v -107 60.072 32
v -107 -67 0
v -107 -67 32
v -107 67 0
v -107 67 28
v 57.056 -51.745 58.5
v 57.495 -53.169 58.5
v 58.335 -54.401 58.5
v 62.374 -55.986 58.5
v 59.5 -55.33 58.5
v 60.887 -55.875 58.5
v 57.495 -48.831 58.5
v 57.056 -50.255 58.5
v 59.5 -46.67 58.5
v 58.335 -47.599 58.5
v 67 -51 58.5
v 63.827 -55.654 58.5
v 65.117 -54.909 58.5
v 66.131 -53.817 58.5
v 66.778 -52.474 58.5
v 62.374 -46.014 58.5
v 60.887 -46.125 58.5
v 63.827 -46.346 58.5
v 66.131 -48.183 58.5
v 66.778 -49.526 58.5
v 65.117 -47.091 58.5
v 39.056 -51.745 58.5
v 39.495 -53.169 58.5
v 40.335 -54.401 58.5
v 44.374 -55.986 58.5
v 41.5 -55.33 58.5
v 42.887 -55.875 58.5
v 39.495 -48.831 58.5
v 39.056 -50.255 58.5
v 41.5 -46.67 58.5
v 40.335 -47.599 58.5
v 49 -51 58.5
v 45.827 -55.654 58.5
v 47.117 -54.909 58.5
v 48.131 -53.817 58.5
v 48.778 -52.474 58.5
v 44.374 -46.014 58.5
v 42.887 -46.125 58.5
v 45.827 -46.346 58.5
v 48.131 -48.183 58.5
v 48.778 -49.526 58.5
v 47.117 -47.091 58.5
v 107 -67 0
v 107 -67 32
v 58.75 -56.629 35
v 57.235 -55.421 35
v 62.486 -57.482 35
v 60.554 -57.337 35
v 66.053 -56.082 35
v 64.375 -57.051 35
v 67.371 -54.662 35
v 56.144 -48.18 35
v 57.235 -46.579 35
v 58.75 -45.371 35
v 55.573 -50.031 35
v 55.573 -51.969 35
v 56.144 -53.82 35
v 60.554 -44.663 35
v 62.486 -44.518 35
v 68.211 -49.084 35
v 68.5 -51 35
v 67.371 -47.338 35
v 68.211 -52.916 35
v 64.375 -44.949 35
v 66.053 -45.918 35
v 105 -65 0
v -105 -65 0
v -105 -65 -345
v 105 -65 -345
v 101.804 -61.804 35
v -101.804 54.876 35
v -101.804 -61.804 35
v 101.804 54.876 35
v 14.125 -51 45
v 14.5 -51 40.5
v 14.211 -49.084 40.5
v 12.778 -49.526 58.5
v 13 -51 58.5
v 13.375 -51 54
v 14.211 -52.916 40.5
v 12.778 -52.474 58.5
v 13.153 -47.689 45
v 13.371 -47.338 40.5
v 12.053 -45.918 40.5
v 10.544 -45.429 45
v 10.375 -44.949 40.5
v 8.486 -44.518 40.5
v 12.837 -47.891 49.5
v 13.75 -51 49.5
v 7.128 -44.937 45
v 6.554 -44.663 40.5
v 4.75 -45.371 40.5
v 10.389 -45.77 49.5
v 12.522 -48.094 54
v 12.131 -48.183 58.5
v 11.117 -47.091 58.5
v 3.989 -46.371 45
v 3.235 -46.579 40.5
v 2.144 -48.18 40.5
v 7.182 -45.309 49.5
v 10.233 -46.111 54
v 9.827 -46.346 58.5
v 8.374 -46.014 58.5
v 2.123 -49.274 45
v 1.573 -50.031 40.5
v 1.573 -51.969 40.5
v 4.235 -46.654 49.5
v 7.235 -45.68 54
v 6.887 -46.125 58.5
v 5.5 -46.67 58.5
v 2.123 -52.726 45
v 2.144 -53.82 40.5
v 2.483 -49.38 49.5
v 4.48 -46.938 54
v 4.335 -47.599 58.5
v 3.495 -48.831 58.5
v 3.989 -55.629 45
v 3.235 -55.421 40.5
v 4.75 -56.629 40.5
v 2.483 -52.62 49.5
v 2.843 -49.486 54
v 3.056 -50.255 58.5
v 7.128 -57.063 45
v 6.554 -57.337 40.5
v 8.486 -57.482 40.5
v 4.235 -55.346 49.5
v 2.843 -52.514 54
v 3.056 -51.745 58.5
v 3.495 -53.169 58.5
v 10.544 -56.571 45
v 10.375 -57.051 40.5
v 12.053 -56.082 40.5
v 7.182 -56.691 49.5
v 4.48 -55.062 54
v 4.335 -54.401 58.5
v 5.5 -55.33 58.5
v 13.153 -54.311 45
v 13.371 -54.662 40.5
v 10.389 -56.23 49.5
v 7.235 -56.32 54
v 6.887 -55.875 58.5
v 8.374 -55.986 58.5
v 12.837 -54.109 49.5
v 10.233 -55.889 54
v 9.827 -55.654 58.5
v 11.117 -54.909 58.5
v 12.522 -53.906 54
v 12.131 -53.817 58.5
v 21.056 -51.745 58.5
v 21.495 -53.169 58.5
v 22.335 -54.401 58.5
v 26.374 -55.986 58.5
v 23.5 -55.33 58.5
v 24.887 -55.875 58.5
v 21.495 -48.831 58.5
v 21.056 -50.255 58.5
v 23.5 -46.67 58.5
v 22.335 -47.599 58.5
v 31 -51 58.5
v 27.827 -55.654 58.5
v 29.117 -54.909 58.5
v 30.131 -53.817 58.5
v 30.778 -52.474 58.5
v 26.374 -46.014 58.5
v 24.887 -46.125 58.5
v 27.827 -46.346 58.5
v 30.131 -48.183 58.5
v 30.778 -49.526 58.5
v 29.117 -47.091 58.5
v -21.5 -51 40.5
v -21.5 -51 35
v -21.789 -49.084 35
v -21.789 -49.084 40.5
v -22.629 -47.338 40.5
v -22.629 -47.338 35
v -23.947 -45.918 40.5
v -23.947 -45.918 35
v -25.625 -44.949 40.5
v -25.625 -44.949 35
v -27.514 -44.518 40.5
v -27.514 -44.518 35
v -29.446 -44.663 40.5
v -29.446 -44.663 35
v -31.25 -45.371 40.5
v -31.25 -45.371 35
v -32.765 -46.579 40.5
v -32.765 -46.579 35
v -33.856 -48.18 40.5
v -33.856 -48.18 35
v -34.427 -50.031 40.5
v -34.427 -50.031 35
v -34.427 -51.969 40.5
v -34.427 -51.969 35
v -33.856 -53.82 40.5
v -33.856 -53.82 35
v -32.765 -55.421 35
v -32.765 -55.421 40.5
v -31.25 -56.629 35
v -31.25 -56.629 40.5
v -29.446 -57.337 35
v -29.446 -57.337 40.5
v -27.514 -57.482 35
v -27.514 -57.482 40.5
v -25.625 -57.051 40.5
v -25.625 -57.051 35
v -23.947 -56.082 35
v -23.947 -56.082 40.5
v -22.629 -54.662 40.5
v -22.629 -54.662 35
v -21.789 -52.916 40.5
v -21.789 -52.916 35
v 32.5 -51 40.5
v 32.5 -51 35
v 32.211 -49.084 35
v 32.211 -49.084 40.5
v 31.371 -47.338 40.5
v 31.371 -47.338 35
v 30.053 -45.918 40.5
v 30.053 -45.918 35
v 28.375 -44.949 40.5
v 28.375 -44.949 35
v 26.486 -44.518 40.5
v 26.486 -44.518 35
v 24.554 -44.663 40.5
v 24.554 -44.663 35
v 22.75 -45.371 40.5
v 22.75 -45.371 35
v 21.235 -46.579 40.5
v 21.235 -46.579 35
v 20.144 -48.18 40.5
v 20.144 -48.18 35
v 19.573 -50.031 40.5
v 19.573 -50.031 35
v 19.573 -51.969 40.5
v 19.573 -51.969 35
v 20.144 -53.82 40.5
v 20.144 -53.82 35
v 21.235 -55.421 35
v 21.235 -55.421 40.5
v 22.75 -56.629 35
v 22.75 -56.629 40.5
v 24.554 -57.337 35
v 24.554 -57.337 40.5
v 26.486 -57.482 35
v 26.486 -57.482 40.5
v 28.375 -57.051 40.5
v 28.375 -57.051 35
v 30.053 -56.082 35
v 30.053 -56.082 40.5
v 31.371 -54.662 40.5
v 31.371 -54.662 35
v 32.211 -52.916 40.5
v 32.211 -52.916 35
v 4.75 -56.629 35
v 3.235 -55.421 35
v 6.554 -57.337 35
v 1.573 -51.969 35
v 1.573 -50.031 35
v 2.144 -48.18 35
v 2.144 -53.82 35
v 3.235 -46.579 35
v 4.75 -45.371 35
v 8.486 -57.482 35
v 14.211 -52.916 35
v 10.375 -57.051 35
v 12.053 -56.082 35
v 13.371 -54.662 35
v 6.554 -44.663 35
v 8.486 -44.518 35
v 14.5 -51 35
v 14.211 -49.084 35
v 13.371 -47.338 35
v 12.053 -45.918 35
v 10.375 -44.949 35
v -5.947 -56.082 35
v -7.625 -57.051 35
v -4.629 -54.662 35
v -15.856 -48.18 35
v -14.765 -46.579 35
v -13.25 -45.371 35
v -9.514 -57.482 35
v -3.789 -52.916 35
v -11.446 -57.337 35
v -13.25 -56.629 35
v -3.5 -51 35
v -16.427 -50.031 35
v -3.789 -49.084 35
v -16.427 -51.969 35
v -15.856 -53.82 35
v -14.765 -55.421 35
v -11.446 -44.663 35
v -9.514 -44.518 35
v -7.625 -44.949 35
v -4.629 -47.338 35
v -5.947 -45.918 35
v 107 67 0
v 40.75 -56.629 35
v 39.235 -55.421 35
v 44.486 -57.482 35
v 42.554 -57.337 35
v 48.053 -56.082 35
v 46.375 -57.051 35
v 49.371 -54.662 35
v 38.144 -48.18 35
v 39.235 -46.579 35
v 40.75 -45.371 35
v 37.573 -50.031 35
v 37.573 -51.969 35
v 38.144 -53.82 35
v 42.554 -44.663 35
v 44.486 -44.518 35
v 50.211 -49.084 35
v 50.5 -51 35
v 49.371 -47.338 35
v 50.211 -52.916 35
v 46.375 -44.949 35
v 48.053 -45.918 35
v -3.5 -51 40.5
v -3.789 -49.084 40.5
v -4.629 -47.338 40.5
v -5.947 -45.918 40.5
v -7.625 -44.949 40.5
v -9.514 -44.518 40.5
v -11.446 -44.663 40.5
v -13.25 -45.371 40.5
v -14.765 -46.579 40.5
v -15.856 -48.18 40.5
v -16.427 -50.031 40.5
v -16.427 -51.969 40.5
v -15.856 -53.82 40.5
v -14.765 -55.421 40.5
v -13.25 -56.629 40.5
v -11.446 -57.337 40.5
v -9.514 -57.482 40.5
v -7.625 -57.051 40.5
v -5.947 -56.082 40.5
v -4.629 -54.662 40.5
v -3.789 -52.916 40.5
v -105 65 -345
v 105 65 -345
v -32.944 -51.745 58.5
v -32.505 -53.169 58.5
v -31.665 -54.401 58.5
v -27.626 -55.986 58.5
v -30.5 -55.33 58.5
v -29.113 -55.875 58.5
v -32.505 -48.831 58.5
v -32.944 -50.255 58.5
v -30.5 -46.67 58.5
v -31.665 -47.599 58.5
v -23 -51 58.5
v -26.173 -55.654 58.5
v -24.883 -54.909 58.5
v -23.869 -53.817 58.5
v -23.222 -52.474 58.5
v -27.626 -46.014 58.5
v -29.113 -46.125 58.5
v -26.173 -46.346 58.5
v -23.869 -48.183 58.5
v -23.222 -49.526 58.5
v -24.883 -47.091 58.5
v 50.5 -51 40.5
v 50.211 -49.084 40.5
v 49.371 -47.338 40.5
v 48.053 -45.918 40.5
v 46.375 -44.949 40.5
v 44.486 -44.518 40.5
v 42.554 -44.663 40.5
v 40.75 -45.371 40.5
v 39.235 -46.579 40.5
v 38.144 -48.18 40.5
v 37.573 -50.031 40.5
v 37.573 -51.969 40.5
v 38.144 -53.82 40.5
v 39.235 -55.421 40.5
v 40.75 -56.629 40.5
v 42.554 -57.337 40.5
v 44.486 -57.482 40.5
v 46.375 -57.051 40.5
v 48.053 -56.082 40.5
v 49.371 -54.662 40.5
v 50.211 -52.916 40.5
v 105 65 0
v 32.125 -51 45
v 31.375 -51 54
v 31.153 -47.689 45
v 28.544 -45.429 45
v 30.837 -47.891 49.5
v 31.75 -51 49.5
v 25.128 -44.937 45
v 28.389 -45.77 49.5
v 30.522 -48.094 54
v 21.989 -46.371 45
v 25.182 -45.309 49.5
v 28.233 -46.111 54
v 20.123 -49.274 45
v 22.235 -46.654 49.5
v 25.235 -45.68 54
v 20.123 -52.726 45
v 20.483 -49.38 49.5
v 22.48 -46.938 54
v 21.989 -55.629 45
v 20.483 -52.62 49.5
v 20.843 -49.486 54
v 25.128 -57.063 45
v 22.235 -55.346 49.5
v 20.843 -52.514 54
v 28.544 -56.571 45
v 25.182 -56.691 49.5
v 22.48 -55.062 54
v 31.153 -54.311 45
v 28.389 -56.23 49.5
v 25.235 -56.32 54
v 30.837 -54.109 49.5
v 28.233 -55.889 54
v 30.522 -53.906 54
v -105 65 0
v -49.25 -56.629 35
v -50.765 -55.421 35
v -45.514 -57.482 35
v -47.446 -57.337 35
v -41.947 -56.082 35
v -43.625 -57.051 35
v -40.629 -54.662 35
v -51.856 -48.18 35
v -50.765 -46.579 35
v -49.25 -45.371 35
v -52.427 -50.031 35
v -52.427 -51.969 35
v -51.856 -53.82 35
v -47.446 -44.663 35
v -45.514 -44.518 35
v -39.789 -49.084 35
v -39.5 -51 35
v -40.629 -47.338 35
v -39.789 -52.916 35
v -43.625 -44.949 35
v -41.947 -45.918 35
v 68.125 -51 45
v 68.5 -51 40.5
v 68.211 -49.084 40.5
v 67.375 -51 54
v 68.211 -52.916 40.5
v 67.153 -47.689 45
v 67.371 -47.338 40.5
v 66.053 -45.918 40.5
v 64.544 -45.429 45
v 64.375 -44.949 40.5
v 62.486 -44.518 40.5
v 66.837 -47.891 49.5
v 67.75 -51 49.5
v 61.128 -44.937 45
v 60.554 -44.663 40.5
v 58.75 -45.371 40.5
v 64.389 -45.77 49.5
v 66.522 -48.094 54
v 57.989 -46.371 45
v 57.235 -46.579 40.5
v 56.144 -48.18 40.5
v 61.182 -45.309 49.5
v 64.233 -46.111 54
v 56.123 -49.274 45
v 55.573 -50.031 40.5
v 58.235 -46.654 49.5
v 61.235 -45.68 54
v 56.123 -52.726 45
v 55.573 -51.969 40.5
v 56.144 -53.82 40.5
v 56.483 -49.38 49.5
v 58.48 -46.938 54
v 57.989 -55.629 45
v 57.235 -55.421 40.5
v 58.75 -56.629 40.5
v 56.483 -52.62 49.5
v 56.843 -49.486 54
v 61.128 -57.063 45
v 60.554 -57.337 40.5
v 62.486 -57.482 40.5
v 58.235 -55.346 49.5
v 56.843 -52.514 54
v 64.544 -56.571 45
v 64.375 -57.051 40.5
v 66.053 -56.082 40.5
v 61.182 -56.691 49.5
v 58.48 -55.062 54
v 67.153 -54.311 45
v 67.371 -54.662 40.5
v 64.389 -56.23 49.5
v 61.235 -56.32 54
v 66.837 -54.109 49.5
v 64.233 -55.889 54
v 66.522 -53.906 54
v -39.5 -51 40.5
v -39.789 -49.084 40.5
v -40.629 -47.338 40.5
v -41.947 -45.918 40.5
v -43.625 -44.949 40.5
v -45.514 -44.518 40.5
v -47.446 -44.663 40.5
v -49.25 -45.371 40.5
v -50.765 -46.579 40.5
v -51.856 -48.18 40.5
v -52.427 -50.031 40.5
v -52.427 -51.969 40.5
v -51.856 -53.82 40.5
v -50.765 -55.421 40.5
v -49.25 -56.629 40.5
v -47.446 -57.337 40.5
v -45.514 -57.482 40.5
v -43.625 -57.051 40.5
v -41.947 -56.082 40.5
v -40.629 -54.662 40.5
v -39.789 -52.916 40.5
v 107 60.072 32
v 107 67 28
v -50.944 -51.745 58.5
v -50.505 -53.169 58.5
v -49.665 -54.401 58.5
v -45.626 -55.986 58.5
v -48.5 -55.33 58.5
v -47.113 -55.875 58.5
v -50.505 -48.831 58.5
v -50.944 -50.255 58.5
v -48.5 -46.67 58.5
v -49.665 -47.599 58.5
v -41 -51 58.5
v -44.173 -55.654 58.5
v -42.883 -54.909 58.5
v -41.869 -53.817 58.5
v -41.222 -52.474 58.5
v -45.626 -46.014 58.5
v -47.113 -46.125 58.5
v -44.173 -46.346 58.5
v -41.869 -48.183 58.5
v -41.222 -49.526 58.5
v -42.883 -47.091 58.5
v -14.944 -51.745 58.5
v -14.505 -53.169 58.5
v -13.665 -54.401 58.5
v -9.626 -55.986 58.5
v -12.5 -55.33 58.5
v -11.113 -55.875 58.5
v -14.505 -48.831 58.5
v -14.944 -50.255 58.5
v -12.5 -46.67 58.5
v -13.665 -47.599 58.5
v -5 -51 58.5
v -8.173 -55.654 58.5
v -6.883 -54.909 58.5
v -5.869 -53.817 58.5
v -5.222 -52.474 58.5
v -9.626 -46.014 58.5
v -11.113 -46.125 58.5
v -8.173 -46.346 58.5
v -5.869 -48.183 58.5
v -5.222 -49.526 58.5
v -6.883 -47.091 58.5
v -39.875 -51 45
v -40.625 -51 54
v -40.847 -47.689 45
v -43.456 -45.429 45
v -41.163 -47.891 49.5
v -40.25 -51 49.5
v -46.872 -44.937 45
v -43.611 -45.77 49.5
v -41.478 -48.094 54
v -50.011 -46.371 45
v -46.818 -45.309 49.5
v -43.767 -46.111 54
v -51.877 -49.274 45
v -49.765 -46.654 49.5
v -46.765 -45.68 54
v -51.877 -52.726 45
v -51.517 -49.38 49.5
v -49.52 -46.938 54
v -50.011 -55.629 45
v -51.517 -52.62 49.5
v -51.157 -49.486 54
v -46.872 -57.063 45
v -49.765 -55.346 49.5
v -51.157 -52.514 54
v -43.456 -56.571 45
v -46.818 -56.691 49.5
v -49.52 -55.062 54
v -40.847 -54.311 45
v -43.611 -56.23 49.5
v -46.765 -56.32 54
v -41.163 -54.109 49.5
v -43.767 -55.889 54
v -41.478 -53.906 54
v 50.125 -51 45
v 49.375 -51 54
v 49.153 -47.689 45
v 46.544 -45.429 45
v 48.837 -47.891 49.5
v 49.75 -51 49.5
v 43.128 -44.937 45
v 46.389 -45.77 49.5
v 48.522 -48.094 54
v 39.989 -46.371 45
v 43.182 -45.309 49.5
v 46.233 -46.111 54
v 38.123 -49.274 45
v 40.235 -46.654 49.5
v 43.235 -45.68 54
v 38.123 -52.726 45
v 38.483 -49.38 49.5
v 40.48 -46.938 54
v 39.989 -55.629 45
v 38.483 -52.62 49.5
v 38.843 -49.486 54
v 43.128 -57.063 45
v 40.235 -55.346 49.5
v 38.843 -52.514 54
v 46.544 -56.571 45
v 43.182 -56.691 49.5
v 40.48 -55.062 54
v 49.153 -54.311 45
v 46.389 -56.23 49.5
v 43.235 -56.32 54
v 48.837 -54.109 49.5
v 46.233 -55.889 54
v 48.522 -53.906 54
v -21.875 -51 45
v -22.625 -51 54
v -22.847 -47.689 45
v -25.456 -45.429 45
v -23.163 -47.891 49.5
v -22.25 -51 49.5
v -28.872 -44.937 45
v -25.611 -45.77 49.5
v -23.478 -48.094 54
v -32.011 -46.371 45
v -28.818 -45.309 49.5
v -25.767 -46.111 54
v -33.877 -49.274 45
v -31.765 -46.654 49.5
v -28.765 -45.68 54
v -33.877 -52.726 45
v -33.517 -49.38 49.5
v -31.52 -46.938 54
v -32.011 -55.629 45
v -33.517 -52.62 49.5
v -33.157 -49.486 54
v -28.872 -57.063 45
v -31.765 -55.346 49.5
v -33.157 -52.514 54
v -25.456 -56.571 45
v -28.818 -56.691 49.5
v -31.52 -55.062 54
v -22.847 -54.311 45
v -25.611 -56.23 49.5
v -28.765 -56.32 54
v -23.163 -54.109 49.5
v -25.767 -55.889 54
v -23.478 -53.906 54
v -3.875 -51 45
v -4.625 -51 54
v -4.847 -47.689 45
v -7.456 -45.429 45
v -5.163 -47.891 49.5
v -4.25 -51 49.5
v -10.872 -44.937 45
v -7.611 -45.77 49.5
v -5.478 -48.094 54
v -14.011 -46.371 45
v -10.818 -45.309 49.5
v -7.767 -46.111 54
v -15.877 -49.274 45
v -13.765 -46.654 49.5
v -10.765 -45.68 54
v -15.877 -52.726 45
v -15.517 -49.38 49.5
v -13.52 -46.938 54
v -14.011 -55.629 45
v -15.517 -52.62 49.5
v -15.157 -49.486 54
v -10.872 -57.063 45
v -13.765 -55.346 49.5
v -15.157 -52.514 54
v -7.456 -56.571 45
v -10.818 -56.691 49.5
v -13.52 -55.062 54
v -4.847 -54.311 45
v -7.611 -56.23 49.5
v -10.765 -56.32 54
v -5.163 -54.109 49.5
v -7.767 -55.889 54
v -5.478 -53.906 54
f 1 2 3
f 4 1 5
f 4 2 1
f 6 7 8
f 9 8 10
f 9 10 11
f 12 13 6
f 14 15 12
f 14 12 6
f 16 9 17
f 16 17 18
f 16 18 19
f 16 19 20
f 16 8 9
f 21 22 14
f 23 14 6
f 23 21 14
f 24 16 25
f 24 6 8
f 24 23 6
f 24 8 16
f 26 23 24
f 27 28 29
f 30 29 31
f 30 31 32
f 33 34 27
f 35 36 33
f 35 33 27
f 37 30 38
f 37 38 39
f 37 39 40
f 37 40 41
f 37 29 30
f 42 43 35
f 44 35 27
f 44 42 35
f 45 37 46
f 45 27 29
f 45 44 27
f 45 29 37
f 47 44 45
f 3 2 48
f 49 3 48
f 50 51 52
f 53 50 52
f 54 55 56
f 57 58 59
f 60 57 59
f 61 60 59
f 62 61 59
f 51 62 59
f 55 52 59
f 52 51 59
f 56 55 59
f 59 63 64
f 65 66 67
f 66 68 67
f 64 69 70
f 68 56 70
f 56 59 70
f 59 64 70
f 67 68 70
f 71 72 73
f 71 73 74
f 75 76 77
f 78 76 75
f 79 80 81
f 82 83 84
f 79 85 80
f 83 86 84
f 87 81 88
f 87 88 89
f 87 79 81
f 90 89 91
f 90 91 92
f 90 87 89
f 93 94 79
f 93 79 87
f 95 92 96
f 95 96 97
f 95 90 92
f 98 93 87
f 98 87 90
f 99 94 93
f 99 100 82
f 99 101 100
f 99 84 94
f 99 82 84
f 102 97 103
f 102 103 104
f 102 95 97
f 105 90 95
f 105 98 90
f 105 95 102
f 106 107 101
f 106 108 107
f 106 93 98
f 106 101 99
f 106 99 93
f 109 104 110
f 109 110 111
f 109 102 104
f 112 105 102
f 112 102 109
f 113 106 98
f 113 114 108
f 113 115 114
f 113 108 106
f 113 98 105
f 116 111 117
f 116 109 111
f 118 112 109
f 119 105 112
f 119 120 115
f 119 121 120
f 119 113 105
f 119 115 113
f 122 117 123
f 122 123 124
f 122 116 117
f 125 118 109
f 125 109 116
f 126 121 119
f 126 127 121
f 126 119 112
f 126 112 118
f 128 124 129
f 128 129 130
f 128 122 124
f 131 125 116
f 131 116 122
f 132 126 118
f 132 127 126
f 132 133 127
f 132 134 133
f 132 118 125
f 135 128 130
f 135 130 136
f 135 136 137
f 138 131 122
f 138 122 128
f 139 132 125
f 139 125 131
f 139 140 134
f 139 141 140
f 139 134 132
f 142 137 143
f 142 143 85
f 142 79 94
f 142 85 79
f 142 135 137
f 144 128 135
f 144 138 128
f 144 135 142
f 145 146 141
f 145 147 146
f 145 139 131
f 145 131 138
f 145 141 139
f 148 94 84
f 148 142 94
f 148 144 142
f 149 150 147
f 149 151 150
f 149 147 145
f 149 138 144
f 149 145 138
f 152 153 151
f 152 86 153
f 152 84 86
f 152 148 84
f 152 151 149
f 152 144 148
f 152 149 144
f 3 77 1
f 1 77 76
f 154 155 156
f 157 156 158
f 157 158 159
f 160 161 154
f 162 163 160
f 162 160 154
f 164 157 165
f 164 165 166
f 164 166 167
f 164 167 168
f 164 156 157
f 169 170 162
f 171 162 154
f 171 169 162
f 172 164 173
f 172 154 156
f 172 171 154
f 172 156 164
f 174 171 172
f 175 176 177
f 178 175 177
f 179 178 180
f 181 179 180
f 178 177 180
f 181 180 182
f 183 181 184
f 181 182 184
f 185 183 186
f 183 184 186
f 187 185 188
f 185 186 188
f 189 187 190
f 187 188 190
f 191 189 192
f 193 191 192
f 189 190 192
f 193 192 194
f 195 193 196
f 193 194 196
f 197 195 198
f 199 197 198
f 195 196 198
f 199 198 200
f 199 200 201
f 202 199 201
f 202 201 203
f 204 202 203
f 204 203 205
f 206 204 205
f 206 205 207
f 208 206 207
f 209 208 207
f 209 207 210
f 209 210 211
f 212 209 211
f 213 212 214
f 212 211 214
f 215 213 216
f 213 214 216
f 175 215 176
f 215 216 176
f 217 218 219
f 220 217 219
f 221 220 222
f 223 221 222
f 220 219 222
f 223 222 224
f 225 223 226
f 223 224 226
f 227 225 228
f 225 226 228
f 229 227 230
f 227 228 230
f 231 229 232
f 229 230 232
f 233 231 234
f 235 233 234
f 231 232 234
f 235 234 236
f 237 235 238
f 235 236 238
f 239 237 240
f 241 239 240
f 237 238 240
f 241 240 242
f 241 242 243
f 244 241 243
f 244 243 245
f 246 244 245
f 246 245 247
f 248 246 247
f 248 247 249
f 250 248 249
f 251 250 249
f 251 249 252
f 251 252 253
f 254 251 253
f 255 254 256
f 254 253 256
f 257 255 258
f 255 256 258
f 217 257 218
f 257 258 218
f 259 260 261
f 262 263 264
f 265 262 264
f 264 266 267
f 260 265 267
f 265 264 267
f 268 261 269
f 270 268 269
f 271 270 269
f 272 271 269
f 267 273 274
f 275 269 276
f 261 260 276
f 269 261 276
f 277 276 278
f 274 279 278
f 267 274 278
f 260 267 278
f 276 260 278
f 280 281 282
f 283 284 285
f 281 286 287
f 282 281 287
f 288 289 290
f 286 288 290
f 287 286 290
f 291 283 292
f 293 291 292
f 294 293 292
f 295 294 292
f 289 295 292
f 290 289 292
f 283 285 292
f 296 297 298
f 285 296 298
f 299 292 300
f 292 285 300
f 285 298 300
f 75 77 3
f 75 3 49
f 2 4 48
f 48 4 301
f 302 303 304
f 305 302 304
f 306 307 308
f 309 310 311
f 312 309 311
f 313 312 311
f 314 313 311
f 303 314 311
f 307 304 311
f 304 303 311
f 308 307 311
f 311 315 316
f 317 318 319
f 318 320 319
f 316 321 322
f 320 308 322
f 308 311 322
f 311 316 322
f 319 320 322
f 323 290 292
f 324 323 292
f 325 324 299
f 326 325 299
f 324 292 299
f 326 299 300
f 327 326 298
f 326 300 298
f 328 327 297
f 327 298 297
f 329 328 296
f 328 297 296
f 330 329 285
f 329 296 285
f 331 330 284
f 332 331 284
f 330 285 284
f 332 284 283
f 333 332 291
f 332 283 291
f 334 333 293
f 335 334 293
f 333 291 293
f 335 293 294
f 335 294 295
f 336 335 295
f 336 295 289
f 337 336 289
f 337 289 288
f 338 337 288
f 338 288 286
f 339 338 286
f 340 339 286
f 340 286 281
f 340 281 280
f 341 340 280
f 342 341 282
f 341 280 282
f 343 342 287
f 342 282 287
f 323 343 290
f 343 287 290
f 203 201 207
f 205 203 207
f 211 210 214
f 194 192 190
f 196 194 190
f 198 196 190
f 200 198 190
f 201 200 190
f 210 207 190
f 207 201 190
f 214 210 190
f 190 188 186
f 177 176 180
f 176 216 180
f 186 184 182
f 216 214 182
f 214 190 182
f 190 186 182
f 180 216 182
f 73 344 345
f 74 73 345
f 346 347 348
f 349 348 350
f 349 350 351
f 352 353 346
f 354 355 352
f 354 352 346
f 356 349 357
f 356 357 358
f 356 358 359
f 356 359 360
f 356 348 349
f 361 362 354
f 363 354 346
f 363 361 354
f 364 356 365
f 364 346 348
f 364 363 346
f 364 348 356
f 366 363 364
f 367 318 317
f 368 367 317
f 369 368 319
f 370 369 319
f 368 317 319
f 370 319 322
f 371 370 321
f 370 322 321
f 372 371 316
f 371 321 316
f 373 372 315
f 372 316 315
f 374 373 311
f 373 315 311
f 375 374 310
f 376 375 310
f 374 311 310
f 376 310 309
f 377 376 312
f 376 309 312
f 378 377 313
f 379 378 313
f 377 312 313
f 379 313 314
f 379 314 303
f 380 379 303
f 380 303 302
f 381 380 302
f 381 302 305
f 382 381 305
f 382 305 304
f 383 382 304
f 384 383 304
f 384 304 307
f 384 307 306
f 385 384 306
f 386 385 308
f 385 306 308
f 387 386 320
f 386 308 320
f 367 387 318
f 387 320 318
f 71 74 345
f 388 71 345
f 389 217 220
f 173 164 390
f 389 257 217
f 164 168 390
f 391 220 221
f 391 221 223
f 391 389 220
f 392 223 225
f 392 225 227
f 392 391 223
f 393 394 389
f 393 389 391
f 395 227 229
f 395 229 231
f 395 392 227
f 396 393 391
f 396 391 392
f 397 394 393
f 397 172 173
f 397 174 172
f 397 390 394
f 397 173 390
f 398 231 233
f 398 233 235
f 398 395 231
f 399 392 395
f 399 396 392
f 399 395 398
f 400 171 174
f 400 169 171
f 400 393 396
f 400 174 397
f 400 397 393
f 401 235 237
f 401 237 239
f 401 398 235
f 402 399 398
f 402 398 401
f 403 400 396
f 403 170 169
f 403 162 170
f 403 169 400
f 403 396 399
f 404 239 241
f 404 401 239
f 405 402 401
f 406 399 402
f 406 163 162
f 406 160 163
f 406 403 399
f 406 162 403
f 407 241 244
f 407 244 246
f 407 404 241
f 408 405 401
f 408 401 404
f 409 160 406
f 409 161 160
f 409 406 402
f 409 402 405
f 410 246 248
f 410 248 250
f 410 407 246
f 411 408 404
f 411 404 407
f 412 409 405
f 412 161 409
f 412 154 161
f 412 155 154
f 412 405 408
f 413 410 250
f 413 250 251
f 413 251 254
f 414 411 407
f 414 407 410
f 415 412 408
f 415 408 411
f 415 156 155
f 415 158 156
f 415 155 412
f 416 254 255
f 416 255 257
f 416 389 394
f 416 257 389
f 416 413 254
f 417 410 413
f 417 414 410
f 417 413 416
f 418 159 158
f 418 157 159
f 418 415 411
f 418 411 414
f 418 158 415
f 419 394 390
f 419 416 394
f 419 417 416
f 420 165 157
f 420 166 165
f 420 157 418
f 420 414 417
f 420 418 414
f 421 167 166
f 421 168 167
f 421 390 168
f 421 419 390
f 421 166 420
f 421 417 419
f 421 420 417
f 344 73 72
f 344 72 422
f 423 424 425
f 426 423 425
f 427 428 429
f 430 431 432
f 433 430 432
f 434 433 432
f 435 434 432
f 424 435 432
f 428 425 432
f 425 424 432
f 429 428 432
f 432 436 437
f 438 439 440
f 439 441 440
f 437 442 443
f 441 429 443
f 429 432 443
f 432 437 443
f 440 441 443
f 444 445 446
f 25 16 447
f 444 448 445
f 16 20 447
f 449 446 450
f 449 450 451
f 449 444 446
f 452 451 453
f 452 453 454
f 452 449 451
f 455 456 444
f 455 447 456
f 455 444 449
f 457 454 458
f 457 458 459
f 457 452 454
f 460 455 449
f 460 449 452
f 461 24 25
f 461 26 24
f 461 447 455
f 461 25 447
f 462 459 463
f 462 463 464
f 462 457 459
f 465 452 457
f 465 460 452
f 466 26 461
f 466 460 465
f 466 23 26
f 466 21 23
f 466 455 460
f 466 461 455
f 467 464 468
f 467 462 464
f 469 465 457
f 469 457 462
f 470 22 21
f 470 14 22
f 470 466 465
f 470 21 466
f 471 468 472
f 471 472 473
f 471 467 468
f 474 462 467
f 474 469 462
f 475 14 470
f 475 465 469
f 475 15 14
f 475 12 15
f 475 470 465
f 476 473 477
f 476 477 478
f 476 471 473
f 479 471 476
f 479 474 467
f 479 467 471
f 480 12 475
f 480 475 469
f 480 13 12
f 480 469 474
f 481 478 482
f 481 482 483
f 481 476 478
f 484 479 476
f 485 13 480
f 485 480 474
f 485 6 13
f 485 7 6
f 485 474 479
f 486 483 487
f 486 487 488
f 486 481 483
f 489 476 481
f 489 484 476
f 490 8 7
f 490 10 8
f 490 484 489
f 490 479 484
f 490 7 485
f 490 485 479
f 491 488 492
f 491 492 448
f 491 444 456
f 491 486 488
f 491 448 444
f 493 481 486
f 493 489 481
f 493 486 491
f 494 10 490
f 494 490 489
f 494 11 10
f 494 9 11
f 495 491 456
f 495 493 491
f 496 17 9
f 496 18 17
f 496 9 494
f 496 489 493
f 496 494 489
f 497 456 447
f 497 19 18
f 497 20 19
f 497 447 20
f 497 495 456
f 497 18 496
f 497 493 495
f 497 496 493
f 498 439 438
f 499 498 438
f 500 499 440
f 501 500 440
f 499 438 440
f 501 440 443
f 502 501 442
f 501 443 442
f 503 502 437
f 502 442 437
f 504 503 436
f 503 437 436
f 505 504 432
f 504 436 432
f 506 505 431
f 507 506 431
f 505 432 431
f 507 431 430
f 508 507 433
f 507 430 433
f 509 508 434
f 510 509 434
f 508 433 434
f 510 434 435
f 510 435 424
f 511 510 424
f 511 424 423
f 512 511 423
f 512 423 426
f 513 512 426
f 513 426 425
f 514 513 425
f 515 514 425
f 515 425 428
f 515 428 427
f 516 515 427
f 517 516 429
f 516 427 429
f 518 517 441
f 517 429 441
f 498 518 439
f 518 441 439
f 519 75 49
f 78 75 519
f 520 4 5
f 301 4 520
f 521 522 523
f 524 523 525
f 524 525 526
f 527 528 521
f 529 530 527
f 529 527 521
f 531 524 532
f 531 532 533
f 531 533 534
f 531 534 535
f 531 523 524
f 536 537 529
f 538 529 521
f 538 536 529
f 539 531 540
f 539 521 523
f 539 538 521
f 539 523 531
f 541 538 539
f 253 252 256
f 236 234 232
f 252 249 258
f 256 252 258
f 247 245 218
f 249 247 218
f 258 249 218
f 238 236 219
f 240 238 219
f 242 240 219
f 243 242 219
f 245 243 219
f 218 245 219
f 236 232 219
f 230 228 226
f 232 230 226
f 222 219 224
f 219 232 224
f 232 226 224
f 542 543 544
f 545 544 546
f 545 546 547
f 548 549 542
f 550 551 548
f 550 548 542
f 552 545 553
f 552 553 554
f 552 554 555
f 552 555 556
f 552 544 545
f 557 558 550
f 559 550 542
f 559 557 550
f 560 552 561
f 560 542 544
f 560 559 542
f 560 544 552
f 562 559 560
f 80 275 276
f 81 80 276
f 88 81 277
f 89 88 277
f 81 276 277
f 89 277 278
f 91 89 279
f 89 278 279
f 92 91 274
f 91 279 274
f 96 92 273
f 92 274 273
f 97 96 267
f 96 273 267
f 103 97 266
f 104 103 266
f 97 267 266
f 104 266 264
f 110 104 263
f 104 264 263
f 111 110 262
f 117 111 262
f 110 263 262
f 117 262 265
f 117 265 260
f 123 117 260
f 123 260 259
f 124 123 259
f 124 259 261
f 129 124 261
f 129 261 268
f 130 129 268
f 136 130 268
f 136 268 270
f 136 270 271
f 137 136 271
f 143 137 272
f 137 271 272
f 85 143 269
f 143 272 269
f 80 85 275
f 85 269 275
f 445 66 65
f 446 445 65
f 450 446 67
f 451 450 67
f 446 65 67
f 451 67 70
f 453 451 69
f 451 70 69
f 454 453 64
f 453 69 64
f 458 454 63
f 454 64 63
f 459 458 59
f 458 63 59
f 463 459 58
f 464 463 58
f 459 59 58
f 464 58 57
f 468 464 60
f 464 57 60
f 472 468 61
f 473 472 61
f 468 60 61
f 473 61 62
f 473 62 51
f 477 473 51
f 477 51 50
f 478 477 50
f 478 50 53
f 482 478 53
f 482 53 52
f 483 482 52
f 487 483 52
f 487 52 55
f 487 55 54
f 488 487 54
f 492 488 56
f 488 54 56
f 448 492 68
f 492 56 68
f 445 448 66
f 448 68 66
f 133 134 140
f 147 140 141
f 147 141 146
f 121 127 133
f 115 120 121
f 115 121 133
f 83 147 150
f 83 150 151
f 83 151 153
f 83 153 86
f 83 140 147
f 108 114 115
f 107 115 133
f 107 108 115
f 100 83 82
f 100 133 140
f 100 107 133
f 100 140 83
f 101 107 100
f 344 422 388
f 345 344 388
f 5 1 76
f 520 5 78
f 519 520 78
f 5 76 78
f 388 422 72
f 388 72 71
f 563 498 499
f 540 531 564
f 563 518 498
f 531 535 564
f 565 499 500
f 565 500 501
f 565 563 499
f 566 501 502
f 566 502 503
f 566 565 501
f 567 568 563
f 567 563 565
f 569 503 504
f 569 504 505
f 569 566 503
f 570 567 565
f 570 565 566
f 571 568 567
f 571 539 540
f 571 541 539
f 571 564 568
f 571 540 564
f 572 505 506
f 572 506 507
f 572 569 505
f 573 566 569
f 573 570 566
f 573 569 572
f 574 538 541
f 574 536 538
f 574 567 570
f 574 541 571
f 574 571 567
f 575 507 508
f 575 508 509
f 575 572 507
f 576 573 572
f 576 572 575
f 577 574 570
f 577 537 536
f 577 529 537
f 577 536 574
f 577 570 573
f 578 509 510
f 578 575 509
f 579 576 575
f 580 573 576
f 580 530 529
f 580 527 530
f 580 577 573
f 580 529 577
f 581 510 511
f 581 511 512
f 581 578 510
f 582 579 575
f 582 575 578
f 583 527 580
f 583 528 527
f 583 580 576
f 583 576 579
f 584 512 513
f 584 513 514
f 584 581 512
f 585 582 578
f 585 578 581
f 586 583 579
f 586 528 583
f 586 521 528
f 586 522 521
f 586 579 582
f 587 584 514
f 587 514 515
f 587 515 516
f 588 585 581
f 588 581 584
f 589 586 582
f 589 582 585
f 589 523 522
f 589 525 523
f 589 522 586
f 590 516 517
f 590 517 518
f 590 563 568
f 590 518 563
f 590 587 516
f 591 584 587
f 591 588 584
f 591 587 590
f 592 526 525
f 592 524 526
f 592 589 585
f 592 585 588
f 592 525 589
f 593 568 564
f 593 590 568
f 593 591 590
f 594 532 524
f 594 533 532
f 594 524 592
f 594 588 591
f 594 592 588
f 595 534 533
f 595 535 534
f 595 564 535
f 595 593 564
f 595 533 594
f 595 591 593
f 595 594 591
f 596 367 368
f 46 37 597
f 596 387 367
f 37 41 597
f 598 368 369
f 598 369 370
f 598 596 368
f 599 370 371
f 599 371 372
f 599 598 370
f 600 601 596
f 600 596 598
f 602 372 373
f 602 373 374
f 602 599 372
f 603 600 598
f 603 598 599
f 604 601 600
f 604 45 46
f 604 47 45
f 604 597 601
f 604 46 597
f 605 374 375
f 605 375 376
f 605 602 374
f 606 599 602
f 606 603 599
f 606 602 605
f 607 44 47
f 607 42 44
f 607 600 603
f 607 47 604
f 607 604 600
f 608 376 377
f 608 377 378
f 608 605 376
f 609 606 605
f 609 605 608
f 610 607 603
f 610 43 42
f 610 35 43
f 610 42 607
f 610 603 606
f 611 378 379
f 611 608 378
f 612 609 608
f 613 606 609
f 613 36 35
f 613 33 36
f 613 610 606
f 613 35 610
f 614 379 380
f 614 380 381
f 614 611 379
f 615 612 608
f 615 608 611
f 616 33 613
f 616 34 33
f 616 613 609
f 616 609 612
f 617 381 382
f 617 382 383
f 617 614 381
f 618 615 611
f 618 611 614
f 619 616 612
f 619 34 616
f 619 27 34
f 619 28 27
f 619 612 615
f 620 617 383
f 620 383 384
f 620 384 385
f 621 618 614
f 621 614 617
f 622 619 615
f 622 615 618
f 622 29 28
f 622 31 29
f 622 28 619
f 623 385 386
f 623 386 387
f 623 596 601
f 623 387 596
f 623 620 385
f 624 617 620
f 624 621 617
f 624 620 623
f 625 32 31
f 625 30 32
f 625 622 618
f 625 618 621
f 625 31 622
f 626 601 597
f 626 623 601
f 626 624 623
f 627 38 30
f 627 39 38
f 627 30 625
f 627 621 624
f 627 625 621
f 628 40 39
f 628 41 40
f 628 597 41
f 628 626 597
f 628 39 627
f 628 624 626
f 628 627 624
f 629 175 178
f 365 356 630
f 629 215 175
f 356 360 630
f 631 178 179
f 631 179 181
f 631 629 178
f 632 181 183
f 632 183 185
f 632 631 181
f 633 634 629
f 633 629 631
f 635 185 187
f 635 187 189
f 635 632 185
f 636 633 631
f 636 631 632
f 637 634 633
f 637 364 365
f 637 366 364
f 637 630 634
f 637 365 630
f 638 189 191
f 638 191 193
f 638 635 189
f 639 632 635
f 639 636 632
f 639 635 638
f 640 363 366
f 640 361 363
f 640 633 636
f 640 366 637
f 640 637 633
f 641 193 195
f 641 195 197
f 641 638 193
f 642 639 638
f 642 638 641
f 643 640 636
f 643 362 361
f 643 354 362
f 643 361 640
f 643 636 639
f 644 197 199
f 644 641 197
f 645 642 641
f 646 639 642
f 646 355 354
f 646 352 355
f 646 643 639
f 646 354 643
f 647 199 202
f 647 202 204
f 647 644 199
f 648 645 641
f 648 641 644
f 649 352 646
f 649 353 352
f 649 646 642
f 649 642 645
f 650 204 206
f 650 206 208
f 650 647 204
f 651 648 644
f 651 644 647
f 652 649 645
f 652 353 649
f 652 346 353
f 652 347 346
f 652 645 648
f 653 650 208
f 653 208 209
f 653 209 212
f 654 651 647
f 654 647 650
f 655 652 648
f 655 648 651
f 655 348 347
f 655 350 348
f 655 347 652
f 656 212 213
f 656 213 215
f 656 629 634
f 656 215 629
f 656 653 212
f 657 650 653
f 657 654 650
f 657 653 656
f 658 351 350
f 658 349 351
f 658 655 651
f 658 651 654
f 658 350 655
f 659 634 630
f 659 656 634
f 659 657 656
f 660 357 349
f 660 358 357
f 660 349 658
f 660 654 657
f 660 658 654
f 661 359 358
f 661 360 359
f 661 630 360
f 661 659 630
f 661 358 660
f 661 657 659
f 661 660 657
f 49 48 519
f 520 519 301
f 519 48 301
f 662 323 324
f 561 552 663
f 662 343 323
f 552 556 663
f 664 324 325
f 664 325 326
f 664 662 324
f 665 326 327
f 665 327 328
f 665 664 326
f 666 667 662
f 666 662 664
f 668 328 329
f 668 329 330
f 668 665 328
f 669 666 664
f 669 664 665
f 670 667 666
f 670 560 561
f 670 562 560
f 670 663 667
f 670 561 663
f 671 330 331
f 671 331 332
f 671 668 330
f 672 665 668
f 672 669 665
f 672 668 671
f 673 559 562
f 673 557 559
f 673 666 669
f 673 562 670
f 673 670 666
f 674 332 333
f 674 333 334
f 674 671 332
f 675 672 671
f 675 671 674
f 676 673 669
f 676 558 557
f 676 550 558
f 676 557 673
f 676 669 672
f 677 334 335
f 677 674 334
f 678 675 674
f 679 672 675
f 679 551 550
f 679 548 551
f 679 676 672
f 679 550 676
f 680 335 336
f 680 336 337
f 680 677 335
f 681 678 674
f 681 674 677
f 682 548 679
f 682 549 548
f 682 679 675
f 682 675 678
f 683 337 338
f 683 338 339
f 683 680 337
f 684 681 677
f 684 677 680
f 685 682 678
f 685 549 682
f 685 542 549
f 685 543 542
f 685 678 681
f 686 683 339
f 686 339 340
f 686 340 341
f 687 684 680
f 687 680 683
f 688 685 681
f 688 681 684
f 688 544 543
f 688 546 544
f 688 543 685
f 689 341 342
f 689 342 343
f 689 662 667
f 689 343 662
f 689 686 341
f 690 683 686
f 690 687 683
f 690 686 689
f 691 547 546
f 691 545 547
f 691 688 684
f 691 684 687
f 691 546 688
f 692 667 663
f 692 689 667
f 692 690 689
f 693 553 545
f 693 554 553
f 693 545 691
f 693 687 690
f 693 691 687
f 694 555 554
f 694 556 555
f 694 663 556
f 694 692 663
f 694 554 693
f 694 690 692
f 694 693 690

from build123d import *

# Parameters (mm, degrees)
SKETCH1_W             = 210
SKETCH1_H             = 130
BOSS_EXTRUDE1_DEPTH   = 345
SKETCH2_W             = 214
SKETCH2_H             = 134
BOSS_EXTRUDE2_DEPTH   = 35
CHAMFER2_SIZE         = 7
CHAMFER2_SIZE2        = 12.124355653
CHAMFER3_SIZE         = 3
CHAMFER3_SIZE2        = 5.196152423
CHAMFER3_PART_2_SIZE  = 3
CHAMFER3_PART_2_SIZE2 = 5.196152423
CHAMFER3_PART_3_SIZE  = 3
CHAMFER3_PART_3_SIZE2 = 5.196152423
SKETCH3_R             = 6.5
BOSS_EXTRUDE3_DEPTH   = 5.5
BOSS_EXTRUDE3_2_DEPTH = 5.5
BOSS_EXTRUDE3_3_DEPTH = 5.5
BOSS_EXTRUDE3_4_DEPTH = 5.5
BOSS_EXTRUDE3_5_DEPTH = 5.5
BOSS_EXTRUDE3_6_DEPTH = 5.5
BOSS_EXTRUDE3_7_DEPTH = 5.5
SKETCH5_R             = 6.5
SKETCH6_R             = 5
LPATTERN1_COUNT       = 7
LPATTERN1_PITCH       = 18


with BuildPart() as part:
    # Sketch1 → Boss-Extrude1 (new body)
    with BuildSketch(Plane.XY):
        Rectangle(SKETCH1_W, SKETCH1_H)
    extrude(amount=-BOSS_EXTRUDE1_DEPTH)


with BuildPart() as body_2:
    # Sketch2 → Boss-Extrude2 (new body)
    with BuildSketch(Plane.XY):
        Rectangle(SKETCH2_W, SKETCH2_H)
    extrude(amount=BOSS_EXTRUDE2_DEPTH)

    # Chamfer2
    chamfer2_edges = [body_2.edges().sort_by_distance(p)[0] for p in [
        (0, 67, 35),
    ]]
    chamfer2_side = [body_2.faces().sort_by_distance(p)[0] for p in [
        (0, 67, 17.5),
    ]]
    chamfer(chamfer2_edges, length=CHAMFER2_SIZE, length2=CHAMFER2_SIZE2, reference=chamfer2_side[0])

    # Chamfer3
    chamfer3_edges = [body_2.edges().sort_by_distance(p)[0] for p in [
        (-107, -6.062177826, 35),
    ]]
    chamfer3_side = [body_2.faces().sort_by_distance(p)[0] for p in [
        (-107, -0.574851894, 17.361518613),
    ]]
    chamfer(chamfer3_edges, length=CHAMFER3_SIZE, length2=CHAMFER3_SIZE2, reference=chamfer3_side[0])

    # Chamfer3 part 2
    chamfer3_part_2_edges = [body_2.edges().sort_by_distance(p)[0] for p in [
        (0, -67, 35),
    ]]
    chamfer3_part_2_side = [body_2.faces().sort_by_distance(p)[0] for p in [
        (0, -67, 17.5),
    ]]
    chamfer(chamfer3_part_2_edges, length=CHAMFER3_PART_2_SIZE, length2=CHAMFER3_PART_2_SIZE2, reference=chamfer3_part_2_side[0])

    # Chamfer3 part 3
    chamfer3_part_3_edges = [body_2.edges().sort_by_distance(p)[0] for p in [
        (107, -6.062177826, 35),
    ]]
    chamfer3_part_3_side = [body_2.faces().sort_by_distance(p)[0] for p in [
        (107, -0.574851894, 17.361518613),
    ]]
    chamfer(chamfer3_part_3_edges, length=CHAMFER3_PART_3_SIZE, length2=CHAMFER3_PART_3_SIZE2, reference=chamfer3_part_3_side[0])


with BuildPart() as body_3:
    # Sketch3 → Boss-Extrude3 (new body)
    with BuildSketch(Plane.XY.offset(35)):
        with Locations((-46, -51)):
            Circle(SKETCH3_R)
    extrude(amount=BOSS_EXTRUDE3_DEPTH)

    # Sketch5 → Loft1 section 0
    with BuildSketch(Plane.XY.offset(40.5)):
        with Locations((-46, -51)):
            Circle(SKETCH5_R)
    # Sketch6 → Loft1 section 1
    with BuildSketch(Plane.XY.offset(58.5)):
        with Locations((-46, -51)):
            Circle(SKETCH6_R)
    loft1 = loft()


with BuildPart() as body_4:
    # Sketch3 → Boss-Extrude3 2 (new body)
    with BuildSketch(Plane.XY.offset(35)):
        with Locations((-28, -51)):
            Circle(SKETCH3_R)
    extrude(amount=BOSS_EXTRUDE3_2_DEPTH)



with BuildPart() as body_5:
    # Sketch3 → Boss-Extrude3 3 (new body)
    with BuildSketch(Plane.XY.offset(35)):
        with Locations((-10, -51)):
            Circle(SKETCH3_R)
    extrude(amount=BOSS_EXTRUDE3_3_DEPTH)


with BuildPart() as body_6:
    # Sketch3 → Boss-Extrude3 4 (new body)
    with BuildSketch(Plane.XY.offset(35)):
        with Locations((8, -51)):
            Circle(SKETCH3_R)
    extrude(amount=BOSS_EXTRUDE3_4_DEPTH)


with BuildPart() as body_7:
    # Sketch3 → Boss-Extrude3 5 (new body)
    with BuildSketch(Plane.XY.offset(35)):
        with Locations((26, -51)):
            Circle(SKETCH3_R)
    extrude(amount=BOSS_EXTRUDE3_5_DEPTH)


with BuildPart() as body_8:
    # Sketch3 → Boss-Extrude3 6 (new body)
    with BuildSketch(Plane.XY.offset(35)):
        with Locations((44, -51)):
            Circle(SKETCH3_R)
    extrude(amount=BOSS_EXTRUDE3_6_DEPTH)


with BuildPart() as body_9:
    # Sketch3 → Boss-Extrude3 7 (new body)
    with BuildSketch(Plane.XY.offset(35)):
        with Locations((62, -51)):
            Circle(SKETCH3_R)
    extrude(amount=BOSS_EXTRUDE3_7_DEPTH)


with BuildPart() as body_4_1:
    add(body_4.part)

    add(body_5.part)  # LPattern1 merges body 5

    add(body_6.part)  # LPattern1 merges body 6

    add(body_7.part)  # LPattern1 merges body 7

    add(body_8.part)  # LPattern1 merges body 8

    add(body_9.part)  # LPattern1 merges body 9
    # LPattern1: Loft1 ×7
    with Locations(*[(i * LPATTERN1_PITCH, 0, 0) for i in range(1, LPATTERN1_COUNT)]):
        add(loft1)


solid = Compound([part.part, body_2.part, body_3.part, body_4_1.part])
